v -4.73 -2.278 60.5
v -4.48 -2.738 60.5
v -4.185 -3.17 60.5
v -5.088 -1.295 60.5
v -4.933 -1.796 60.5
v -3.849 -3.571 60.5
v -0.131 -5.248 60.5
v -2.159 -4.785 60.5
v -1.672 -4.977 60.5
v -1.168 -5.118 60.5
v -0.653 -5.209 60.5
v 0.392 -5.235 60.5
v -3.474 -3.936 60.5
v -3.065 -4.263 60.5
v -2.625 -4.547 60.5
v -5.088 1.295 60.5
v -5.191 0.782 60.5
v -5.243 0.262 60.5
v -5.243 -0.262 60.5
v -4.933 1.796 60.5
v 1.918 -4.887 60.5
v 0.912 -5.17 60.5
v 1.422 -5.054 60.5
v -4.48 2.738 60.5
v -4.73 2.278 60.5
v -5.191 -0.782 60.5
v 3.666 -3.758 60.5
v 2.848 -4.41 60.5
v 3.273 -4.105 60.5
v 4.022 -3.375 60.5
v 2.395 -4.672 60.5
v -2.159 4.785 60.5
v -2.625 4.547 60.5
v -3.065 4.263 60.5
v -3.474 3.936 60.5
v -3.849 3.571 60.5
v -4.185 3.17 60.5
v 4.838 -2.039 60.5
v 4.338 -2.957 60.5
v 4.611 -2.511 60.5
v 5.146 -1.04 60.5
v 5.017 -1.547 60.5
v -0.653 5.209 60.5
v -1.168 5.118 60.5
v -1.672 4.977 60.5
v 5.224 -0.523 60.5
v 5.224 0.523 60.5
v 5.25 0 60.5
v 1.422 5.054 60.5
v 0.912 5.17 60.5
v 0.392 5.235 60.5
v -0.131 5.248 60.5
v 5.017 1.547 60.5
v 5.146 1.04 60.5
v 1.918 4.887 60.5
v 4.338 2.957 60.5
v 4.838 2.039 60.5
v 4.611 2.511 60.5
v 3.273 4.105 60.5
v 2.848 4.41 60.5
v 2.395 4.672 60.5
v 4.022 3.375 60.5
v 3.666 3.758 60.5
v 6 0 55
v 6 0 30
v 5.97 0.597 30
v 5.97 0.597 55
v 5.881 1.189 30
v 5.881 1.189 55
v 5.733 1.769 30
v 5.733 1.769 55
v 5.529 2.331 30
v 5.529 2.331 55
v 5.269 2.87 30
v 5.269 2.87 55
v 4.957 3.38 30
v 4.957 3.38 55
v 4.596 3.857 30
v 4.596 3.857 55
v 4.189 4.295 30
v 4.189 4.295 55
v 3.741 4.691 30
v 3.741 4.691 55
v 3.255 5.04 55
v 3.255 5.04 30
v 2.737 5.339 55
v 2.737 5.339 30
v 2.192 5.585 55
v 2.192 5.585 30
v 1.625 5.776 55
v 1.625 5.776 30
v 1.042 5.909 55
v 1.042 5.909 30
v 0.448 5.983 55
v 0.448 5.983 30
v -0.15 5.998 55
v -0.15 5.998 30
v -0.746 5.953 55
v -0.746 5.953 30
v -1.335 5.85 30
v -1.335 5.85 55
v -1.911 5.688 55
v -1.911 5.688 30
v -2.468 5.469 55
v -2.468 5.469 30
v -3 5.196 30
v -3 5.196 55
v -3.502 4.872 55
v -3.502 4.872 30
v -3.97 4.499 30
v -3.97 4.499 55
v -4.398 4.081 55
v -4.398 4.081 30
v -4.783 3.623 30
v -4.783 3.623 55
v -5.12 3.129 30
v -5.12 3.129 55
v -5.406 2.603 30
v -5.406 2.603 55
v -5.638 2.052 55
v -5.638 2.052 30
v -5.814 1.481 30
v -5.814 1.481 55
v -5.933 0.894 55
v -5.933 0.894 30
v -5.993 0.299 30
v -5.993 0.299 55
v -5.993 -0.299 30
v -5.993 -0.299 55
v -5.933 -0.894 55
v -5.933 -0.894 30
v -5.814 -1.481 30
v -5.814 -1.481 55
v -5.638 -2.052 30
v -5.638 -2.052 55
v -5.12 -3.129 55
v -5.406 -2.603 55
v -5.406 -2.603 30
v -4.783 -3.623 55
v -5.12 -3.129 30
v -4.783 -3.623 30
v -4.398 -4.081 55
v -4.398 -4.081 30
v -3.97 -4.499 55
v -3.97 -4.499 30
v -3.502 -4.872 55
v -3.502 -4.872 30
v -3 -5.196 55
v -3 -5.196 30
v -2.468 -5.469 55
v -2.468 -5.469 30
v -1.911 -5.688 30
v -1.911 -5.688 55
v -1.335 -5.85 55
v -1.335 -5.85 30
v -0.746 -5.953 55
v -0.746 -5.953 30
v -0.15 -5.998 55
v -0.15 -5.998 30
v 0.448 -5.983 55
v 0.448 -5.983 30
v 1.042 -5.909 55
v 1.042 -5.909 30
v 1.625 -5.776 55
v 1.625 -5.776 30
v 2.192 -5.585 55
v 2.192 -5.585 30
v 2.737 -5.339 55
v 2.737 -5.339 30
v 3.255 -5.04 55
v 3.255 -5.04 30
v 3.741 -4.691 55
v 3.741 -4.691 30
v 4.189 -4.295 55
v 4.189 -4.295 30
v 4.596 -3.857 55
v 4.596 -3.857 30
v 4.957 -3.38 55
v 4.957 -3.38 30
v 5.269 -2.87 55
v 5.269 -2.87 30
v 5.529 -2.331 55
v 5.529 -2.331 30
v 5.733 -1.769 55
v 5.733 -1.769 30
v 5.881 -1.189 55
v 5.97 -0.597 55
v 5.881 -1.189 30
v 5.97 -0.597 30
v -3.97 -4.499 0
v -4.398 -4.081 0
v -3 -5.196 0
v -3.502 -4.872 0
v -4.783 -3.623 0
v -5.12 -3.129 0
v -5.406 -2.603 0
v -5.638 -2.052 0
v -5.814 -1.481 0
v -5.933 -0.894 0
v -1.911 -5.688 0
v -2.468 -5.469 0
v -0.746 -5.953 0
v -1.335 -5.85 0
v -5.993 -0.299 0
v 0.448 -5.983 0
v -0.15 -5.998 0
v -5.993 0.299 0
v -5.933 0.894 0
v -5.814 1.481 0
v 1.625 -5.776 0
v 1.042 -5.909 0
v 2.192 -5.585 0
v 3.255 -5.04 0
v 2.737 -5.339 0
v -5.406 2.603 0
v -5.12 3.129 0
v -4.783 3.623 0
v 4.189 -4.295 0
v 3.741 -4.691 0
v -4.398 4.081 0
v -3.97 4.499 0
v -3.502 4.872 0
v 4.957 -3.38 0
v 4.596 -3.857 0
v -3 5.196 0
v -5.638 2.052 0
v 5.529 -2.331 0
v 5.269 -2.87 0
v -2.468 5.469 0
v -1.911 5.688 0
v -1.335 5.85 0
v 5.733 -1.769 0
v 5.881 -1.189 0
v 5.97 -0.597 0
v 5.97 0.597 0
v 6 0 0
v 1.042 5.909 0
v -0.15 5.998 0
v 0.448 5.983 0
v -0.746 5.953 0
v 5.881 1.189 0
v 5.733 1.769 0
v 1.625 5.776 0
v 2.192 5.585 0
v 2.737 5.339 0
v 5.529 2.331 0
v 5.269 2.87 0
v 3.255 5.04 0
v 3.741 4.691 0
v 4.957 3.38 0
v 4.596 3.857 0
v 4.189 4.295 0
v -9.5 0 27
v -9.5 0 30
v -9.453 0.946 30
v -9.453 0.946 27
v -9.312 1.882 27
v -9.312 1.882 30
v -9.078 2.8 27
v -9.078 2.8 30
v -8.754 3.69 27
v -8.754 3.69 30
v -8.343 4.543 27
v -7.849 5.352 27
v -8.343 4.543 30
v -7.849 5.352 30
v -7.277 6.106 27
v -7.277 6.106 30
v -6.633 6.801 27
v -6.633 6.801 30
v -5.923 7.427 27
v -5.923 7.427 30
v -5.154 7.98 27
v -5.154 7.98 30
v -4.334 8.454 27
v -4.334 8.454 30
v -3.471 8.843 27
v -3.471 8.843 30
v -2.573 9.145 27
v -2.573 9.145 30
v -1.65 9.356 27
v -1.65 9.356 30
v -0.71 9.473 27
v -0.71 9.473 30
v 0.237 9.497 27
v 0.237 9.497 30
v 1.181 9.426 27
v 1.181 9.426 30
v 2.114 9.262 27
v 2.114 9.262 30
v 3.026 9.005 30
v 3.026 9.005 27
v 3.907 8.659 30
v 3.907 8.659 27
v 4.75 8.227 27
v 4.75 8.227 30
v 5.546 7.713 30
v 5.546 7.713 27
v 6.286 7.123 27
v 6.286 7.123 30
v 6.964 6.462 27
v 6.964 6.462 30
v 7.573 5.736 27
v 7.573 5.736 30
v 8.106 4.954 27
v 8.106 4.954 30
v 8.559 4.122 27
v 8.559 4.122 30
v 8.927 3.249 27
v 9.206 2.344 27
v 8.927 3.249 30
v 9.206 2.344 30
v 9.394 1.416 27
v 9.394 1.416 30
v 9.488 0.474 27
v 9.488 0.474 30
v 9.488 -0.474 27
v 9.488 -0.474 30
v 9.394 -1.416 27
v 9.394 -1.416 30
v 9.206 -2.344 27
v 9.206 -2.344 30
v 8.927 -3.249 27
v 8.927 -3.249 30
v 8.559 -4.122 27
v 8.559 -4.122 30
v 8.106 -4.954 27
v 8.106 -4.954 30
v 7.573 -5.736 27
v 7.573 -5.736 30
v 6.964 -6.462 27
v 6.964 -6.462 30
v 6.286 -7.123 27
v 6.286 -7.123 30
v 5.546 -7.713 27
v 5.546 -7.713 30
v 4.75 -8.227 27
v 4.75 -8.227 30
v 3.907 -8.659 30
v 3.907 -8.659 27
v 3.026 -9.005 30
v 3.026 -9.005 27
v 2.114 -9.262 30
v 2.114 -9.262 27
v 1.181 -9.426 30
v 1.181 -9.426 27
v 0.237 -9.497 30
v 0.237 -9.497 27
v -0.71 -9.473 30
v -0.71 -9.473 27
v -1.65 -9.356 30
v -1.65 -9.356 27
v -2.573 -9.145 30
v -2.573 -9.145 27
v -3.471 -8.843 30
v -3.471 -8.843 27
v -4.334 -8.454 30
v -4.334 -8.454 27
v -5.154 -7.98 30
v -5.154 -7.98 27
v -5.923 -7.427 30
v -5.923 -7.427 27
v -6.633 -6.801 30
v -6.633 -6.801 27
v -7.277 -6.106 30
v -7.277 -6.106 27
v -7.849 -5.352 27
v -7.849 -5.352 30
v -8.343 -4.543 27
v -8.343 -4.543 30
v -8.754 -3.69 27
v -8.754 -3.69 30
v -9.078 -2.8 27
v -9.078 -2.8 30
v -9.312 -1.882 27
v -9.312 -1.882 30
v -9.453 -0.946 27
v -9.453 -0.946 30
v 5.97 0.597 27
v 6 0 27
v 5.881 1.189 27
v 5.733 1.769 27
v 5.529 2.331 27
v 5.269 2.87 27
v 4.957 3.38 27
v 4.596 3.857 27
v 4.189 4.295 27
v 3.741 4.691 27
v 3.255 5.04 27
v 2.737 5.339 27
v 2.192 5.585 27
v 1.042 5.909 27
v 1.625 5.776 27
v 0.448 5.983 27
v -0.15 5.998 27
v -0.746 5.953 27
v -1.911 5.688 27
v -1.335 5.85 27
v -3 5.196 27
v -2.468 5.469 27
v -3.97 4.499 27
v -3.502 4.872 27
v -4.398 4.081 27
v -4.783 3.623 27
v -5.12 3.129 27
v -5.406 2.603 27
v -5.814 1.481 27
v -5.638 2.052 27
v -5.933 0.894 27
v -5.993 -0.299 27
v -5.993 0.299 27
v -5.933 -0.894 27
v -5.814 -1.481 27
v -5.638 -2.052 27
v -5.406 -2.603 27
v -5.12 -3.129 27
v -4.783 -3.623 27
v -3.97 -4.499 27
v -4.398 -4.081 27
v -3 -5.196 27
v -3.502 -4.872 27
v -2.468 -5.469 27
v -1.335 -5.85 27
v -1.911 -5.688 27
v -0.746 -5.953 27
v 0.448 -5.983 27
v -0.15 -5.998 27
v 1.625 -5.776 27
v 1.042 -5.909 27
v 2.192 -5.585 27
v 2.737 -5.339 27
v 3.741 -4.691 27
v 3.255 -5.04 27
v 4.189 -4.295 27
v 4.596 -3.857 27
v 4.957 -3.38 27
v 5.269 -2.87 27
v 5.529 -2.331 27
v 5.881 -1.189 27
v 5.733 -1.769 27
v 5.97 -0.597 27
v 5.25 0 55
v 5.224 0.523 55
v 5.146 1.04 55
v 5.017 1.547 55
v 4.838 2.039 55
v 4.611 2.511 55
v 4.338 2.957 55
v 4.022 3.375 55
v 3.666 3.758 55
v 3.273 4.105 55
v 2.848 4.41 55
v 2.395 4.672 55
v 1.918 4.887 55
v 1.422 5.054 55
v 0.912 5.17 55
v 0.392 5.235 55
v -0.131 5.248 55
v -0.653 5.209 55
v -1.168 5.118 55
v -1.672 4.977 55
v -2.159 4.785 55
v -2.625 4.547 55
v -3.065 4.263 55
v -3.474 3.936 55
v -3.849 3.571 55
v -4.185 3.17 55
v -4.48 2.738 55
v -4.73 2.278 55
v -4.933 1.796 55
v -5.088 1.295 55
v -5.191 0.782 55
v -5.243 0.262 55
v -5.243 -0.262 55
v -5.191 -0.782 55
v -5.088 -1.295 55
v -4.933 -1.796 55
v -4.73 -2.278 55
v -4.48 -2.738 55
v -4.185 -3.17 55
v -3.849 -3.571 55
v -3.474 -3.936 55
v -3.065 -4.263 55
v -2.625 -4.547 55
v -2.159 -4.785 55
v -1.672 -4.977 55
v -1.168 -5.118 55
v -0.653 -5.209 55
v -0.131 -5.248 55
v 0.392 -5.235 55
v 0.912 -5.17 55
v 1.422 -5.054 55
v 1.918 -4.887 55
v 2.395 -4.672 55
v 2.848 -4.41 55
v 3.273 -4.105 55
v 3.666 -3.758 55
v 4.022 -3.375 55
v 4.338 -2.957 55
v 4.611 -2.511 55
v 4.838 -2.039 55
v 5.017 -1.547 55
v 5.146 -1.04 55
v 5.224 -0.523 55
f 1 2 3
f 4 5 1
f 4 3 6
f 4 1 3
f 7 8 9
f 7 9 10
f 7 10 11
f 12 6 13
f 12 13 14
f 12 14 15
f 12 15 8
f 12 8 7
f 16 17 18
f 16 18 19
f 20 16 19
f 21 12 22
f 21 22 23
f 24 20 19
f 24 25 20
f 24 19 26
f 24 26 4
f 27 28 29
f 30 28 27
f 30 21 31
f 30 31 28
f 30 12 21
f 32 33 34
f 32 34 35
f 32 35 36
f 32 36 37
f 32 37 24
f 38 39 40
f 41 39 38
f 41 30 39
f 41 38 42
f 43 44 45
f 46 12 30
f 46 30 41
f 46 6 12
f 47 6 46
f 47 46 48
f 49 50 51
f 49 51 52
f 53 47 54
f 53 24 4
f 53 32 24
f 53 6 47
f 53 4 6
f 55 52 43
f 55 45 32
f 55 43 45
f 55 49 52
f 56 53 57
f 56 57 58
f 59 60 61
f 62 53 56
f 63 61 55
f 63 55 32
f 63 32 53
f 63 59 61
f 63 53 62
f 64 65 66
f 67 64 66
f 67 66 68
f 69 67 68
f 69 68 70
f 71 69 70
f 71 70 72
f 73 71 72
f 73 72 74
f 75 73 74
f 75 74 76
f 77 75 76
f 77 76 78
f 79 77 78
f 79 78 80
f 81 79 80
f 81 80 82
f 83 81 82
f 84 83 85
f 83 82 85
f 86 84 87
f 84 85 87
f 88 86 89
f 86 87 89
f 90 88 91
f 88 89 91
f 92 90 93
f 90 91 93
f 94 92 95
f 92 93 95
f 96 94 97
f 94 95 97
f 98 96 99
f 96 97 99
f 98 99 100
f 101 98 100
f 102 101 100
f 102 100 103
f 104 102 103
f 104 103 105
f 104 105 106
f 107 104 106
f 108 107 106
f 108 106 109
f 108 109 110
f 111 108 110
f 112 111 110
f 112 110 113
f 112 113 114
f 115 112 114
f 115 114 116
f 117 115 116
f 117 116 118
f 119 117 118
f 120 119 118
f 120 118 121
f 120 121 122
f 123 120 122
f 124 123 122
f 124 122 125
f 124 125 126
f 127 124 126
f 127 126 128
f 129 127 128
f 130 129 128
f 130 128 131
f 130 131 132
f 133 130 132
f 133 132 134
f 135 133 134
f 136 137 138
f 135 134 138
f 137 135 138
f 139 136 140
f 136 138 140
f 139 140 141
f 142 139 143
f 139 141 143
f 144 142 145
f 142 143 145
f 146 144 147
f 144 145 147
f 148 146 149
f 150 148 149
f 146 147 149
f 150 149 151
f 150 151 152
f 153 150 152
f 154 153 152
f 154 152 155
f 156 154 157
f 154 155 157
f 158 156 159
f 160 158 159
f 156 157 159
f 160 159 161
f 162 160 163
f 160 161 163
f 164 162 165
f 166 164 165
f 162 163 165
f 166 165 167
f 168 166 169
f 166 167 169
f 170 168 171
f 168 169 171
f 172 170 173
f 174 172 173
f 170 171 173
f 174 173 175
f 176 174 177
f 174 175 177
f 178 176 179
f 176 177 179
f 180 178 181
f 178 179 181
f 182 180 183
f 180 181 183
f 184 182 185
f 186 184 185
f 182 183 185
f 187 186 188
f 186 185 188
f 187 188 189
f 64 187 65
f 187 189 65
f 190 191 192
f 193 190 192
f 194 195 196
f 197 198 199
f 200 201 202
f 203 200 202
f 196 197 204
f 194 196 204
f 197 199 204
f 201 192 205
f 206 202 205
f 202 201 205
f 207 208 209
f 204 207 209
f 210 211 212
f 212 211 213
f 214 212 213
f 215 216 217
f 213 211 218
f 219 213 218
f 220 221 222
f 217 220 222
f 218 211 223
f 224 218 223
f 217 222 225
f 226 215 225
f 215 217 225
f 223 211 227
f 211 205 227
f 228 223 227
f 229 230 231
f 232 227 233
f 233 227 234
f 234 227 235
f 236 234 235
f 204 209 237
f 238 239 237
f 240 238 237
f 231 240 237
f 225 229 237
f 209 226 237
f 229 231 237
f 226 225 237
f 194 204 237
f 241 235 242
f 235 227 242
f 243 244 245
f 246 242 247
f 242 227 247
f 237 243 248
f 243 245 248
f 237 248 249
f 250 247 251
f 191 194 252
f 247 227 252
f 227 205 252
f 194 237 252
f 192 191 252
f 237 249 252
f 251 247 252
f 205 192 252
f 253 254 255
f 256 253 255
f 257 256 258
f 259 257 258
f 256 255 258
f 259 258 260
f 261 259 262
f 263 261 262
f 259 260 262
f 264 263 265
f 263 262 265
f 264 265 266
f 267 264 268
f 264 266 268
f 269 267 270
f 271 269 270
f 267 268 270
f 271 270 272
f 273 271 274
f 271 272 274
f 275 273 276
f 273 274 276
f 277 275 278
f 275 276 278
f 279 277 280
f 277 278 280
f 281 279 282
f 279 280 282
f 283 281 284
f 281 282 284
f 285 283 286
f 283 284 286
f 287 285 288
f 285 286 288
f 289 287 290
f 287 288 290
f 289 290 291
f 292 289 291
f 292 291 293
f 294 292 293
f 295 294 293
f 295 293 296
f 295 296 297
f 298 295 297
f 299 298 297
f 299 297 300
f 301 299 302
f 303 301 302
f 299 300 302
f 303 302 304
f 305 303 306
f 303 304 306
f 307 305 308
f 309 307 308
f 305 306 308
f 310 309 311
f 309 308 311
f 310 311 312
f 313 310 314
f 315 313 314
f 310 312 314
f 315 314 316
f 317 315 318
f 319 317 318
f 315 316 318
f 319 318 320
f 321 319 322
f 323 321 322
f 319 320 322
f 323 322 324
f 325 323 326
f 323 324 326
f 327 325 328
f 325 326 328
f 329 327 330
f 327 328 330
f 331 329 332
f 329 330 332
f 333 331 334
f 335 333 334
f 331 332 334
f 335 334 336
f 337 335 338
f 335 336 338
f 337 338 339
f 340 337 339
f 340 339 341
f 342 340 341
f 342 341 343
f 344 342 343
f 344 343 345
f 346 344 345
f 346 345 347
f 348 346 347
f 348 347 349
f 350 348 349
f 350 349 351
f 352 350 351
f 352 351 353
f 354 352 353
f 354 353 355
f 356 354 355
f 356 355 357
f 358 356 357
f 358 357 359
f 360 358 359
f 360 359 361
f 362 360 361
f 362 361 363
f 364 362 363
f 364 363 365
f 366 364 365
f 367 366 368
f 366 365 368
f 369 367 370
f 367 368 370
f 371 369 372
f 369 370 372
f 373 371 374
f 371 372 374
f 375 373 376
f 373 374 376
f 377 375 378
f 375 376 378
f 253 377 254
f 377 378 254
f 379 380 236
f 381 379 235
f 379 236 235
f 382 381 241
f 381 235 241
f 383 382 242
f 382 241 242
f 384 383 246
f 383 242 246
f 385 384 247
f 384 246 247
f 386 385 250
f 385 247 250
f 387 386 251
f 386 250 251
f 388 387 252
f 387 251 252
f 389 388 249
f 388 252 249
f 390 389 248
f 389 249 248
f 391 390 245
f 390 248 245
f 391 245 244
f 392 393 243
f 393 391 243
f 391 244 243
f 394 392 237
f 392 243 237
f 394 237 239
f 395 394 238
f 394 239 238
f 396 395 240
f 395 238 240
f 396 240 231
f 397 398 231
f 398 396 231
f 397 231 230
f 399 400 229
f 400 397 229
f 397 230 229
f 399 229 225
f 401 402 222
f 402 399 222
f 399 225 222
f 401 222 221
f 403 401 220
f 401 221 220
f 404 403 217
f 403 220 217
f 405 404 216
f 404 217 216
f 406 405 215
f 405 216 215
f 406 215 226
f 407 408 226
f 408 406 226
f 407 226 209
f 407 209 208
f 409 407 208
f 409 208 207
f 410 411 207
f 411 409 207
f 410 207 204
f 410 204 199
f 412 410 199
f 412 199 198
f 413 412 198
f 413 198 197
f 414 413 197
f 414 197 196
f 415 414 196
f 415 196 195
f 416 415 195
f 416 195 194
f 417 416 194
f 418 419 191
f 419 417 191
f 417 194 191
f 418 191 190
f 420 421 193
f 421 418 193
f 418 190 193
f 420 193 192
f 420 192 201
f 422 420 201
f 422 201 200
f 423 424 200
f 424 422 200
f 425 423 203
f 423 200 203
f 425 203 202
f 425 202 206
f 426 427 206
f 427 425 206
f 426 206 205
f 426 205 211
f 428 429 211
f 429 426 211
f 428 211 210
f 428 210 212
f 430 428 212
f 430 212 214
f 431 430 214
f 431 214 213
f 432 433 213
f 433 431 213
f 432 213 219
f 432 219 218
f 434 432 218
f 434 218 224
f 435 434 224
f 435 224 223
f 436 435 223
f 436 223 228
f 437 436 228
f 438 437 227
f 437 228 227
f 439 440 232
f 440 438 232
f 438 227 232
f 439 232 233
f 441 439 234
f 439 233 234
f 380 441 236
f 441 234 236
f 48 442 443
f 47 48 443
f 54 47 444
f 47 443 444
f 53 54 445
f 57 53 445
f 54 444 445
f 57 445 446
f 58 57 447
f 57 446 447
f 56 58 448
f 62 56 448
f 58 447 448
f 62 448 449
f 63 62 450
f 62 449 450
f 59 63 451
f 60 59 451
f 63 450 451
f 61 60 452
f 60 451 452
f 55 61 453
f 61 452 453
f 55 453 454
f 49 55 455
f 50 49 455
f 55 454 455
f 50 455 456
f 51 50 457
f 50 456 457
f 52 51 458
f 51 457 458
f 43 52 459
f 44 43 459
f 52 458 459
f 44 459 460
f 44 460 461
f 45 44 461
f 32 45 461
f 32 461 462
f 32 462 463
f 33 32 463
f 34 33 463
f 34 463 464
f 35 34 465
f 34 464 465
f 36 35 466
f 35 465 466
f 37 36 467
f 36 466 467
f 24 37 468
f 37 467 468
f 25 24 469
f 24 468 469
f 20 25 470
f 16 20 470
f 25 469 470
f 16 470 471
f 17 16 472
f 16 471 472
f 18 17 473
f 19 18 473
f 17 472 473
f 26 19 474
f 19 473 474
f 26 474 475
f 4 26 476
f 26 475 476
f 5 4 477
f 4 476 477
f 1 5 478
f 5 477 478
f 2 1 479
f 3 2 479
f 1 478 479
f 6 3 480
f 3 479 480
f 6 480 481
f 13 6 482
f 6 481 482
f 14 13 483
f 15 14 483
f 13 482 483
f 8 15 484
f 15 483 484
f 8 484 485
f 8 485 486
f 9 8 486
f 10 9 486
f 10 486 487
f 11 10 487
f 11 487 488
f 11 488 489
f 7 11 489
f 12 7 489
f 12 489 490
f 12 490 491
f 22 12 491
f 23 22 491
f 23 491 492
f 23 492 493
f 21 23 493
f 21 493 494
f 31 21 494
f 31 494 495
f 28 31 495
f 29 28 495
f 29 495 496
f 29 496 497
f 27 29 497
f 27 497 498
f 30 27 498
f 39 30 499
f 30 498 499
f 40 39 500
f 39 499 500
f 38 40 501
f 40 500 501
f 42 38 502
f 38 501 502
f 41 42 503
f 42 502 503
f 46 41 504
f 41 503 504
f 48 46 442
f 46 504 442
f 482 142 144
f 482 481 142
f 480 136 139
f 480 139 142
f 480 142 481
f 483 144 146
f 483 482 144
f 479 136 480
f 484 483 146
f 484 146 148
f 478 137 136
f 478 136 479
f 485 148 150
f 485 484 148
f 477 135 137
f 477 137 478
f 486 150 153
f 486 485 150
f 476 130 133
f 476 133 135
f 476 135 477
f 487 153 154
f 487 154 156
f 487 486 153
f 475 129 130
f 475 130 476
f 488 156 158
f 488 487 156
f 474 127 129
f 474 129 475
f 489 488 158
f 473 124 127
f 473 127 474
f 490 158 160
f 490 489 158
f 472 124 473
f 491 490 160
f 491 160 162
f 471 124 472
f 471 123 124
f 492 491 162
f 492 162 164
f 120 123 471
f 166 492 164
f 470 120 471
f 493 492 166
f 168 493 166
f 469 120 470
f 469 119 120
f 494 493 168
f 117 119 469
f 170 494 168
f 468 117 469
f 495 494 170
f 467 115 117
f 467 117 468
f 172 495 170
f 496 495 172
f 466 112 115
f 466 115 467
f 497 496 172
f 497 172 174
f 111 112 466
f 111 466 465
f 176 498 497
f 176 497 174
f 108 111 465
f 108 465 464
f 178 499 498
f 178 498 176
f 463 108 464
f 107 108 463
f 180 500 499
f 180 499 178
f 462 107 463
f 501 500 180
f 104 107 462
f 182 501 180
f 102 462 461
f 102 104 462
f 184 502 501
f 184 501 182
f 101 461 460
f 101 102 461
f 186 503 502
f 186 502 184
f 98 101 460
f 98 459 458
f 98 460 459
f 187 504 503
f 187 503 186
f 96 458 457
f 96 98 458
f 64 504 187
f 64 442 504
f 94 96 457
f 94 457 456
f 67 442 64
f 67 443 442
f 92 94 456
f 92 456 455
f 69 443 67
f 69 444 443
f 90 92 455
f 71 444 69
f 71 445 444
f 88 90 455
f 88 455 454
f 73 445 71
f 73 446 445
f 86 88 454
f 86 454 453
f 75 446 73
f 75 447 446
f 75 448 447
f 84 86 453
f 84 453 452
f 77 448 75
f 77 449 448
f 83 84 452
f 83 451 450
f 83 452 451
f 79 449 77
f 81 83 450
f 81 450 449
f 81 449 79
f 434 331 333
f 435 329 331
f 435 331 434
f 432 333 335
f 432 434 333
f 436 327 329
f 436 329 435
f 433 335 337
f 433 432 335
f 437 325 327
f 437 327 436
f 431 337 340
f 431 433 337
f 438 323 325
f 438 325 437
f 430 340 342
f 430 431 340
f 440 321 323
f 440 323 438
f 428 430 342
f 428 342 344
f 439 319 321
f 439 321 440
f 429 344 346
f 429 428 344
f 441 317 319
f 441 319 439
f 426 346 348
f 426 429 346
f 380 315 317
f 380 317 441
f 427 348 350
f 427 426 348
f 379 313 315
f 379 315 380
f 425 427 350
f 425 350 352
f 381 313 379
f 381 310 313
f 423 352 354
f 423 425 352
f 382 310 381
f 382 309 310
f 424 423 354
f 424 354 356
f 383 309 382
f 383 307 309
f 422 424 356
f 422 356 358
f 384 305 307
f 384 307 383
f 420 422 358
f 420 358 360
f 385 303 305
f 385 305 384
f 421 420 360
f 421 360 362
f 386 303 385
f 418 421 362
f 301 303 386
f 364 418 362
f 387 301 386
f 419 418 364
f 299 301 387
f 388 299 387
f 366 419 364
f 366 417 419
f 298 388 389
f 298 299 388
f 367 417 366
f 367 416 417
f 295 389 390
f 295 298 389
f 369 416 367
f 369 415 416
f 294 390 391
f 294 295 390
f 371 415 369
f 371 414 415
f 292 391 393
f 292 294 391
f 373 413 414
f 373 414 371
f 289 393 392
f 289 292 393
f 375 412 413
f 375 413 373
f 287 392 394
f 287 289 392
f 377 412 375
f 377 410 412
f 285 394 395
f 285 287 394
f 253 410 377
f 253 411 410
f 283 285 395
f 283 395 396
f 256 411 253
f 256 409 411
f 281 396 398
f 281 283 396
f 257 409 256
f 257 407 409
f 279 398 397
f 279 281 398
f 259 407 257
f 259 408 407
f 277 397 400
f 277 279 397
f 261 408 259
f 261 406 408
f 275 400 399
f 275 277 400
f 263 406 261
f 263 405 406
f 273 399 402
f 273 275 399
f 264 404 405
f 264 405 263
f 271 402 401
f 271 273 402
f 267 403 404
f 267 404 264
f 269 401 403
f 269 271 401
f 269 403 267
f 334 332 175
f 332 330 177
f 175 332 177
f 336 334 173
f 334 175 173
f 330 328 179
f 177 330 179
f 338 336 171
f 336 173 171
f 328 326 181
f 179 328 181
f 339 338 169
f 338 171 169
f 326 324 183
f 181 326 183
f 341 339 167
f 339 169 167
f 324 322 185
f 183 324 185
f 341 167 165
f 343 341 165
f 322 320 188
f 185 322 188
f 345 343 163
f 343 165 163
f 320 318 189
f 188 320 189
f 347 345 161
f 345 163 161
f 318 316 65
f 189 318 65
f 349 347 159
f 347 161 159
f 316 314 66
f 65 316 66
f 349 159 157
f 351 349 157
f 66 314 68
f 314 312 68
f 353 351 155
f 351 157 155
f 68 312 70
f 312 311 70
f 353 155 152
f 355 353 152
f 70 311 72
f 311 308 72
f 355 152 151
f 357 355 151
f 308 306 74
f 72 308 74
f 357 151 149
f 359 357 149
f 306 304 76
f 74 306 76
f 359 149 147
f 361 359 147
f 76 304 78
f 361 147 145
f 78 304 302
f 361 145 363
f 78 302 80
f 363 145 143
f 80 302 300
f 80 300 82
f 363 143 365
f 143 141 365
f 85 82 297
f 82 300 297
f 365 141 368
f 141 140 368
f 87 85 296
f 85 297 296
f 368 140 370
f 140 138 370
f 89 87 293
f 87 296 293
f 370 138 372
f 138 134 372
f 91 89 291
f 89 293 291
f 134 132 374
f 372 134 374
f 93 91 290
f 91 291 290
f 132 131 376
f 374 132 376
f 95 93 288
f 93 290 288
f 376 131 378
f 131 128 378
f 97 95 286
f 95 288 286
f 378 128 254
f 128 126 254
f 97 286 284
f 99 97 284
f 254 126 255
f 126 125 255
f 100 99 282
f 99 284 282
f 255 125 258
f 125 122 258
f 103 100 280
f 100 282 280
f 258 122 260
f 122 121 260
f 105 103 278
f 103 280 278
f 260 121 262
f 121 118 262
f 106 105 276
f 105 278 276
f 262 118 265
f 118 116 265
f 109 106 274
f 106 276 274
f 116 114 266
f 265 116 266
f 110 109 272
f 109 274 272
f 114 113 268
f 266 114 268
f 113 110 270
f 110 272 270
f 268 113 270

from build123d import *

# Parameters (mm, degrees)
SKETCH_1_R      = 6
EXTRUDE_1_DEPTH = 55
SKETCH_2_R      = 5.25
EXTRUDE_2_DEPTH = 5.5
EXTRUDE_START   = -30
SKETCH_3_R      = 9.5
EXTRUDE_3_DEPTH = 3


with BuildPart() as part:
    # Эскиз1 → Бобышка-Вытянуть1 (new body)
    with BuildSketch(Plane.XY):
        Circle(SKETCH_1_R)
    extrude(amount=EXTRUDE_1_DEPTH)

    # Эскиз2 → Бобышка-Вытянуть2 (add)
    with BuildSketch(Plane.XY.offset(55)):
        Circle(SKETCH_2_R)
    extrude(amount=EXTRUDE_2_DEPTH)

    # Эскиз3 → Бобышка-Вытянуть3 (add)
    with BuildSketch(Plane(origin=(0, 0, 0), x_dir=(-1, 0, 0), z_dir=(0, 0, -1)).offset(EXTRUDE_START)):
        Circle(SKETCH_3_R)
    extrude(amount=EXTRUDE_3_DEPTH)


solid = part.part
